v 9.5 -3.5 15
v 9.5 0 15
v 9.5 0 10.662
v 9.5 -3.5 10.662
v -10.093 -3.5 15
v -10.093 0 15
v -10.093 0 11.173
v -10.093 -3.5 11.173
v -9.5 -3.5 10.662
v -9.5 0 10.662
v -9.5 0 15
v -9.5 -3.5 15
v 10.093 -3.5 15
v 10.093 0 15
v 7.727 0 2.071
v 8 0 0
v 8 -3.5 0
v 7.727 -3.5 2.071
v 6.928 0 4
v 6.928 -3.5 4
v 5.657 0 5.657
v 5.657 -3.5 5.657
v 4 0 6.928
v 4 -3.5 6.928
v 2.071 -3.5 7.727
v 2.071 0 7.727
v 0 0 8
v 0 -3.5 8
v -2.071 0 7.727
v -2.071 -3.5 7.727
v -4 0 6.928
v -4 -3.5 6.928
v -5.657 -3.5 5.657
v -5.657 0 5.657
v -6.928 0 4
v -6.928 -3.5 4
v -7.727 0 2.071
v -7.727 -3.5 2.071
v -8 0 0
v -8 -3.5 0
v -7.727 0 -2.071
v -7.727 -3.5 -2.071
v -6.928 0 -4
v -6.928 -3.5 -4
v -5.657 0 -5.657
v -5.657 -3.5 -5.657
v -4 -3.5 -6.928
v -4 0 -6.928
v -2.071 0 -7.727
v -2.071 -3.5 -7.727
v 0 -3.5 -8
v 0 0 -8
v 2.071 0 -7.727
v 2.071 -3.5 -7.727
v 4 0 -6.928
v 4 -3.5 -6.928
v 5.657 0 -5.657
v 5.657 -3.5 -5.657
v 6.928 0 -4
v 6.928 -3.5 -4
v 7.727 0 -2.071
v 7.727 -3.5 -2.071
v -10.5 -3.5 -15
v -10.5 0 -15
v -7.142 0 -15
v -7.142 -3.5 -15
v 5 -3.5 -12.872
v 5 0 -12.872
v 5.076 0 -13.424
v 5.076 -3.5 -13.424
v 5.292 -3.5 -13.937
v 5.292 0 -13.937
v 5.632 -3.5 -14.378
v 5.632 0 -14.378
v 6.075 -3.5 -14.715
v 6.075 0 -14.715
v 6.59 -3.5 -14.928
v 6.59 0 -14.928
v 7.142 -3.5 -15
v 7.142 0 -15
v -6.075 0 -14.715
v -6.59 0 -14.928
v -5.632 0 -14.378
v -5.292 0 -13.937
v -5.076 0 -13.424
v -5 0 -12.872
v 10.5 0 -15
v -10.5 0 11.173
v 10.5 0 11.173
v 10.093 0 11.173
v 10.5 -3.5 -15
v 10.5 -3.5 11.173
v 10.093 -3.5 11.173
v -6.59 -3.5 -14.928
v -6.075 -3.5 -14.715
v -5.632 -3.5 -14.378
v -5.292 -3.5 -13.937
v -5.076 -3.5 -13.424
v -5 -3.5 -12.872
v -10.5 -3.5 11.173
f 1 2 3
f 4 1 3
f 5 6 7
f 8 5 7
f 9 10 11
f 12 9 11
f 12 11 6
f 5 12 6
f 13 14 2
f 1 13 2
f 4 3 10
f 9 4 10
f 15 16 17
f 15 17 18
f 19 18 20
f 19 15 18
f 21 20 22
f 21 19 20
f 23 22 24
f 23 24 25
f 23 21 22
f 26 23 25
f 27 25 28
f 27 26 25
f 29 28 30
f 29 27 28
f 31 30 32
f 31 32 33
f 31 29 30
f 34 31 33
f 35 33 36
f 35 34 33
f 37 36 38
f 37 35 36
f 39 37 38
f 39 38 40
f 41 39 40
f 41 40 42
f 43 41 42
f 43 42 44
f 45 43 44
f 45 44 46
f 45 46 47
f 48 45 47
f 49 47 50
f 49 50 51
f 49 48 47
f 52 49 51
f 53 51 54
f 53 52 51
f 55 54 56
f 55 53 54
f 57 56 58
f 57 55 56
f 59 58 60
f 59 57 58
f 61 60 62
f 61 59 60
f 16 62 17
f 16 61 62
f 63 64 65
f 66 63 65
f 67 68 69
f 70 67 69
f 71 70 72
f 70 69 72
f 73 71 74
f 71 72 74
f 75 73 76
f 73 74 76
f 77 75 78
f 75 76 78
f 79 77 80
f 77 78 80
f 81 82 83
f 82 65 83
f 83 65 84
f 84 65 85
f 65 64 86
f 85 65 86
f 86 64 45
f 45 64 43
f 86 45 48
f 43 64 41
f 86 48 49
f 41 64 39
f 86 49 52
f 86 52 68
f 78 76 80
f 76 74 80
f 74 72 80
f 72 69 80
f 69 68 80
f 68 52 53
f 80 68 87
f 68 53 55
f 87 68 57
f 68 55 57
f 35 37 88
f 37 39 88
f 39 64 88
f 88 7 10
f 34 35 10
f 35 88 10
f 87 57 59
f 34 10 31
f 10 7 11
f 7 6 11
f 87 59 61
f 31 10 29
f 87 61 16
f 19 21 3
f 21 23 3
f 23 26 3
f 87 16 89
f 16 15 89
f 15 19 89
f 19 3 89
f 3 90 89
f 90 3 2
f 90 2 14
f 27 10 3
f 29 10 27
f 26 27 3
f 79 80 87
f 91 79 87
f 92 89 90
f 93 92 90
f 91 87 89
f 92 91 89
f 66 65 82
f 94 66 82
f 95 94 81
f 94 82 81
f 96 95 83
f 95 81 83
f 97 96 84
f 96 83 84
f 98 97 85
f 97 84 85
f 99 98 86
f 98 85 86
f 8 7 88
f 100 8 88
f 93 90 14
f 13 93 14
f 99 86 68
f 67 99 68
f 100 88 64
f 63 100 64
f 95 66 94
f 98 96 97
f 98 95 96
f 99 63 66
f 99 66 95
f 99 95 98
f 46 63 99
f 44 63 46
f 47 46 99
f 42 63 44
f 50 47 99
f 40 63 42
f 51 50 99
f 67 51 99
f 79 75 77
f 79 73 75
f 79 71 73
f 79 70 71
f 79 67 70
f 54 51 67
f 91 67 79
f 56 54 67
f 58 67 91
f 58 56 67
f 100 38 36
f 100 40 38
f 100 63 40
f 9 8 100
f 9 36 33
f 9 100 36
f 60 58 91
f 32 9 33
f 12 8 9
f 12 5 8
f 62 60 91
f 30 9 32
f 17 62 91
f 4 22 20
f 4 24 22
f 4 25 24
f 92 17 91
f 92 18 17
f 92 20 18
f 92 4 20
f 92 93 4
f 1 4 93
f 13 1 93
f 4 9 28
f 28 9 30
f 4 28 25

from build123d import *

# Parameters (mm, degrees)
F0_R        = 8
F1_DEPTH    = 3.5
F2_T4_DEPTH = 14.2095720734
F2_T9_DEPTH = 14.2095720734


# Not quite as in the source:
# - a fillet or chamfer that OpenCascade refuses, or shapes differently, is made with other operations: its cross-section is extruded or revolved along the edge and cut away or added


with BuildPart() as f1:
    # F0 (on Front) → F1 (new body)
    with BuildSketch(Plane.XZ):
        Polygon((5, -15), (10.5, -15), (10.5, 11.1734773964), (10.0929150358, 11.1734773964), (10.0929150358, 15), (9.5, 15), (9.5, 10.6615237892), (-9.5, 10.6615237892), (-9.5, 15), (-10.0929150358, 15), (-10.0929150358, 11.1734773964), (-10.5, 11.1734773964), (-10.5, -15), (-5, -15), (-5, -12.8721727654), (5, -12.8721727654), align=None)
        Circle(F0_R, mode=Mode.SUBTRACT)
    extrude(amount=F1_DEPTH)

    # F2: fillet of radius 2.1419144147 on 2 edges, made by hand


with BuildPart() as f2_tool2:
    # F2_s3 → F2_t4 (new body)
    with BuildSketch(Plane.XZ.offset(-5.3547860367)):
        with BuildLine():
            ThreePointArc((-7.1419144147, -15), (-5.6273522073, -14.3726477927), (-5, -12.8580855853))
            Line((-5, -12.8580855853), (-5, -15))
            Line((-5, -15), (-7.1419144147, -15))
        make_face()
    extrude(amount=F2_T4_DEPTH)

    split(bisect_by=Plane.XY.offset(-12.8721727654), keep=Keep.BOTTOM)


with BuildPart() as f1_1:
    add(f1.part)

    # F2_t1: cut F2_tool2
    add(f2_tool2.part, mode=Mode.SUBTRACT)


with BuildPart() as f2_tool7:
    # F2_s8 → F2_t9 (new body)
    with BuildSketch(Plane.XZ.offset(-5.3547860367)):
        with BuildLine():
            ThreePointArc((5, -12.8580855853), (5.6273522073, -14.3726477927), (7.1419144147, -15))
            Line((7.1419144147, -15), (5, -15))
            Line((5, -15), (5, -12.8580855853))
        make_face()
    extrude(amount=F2_T9_DEPTH)

    split(bisect_by=Plane.XY.offset(-12.8721727654), keep=Keep.BOTTOM)


with BuildPart() as f1_2:
    add(f1_1.part)

    # F2_t6: cut F2_tool7
    add(f2_tool7.part, mode=Mode.SUBTRACT)


solid = f1_2.part
